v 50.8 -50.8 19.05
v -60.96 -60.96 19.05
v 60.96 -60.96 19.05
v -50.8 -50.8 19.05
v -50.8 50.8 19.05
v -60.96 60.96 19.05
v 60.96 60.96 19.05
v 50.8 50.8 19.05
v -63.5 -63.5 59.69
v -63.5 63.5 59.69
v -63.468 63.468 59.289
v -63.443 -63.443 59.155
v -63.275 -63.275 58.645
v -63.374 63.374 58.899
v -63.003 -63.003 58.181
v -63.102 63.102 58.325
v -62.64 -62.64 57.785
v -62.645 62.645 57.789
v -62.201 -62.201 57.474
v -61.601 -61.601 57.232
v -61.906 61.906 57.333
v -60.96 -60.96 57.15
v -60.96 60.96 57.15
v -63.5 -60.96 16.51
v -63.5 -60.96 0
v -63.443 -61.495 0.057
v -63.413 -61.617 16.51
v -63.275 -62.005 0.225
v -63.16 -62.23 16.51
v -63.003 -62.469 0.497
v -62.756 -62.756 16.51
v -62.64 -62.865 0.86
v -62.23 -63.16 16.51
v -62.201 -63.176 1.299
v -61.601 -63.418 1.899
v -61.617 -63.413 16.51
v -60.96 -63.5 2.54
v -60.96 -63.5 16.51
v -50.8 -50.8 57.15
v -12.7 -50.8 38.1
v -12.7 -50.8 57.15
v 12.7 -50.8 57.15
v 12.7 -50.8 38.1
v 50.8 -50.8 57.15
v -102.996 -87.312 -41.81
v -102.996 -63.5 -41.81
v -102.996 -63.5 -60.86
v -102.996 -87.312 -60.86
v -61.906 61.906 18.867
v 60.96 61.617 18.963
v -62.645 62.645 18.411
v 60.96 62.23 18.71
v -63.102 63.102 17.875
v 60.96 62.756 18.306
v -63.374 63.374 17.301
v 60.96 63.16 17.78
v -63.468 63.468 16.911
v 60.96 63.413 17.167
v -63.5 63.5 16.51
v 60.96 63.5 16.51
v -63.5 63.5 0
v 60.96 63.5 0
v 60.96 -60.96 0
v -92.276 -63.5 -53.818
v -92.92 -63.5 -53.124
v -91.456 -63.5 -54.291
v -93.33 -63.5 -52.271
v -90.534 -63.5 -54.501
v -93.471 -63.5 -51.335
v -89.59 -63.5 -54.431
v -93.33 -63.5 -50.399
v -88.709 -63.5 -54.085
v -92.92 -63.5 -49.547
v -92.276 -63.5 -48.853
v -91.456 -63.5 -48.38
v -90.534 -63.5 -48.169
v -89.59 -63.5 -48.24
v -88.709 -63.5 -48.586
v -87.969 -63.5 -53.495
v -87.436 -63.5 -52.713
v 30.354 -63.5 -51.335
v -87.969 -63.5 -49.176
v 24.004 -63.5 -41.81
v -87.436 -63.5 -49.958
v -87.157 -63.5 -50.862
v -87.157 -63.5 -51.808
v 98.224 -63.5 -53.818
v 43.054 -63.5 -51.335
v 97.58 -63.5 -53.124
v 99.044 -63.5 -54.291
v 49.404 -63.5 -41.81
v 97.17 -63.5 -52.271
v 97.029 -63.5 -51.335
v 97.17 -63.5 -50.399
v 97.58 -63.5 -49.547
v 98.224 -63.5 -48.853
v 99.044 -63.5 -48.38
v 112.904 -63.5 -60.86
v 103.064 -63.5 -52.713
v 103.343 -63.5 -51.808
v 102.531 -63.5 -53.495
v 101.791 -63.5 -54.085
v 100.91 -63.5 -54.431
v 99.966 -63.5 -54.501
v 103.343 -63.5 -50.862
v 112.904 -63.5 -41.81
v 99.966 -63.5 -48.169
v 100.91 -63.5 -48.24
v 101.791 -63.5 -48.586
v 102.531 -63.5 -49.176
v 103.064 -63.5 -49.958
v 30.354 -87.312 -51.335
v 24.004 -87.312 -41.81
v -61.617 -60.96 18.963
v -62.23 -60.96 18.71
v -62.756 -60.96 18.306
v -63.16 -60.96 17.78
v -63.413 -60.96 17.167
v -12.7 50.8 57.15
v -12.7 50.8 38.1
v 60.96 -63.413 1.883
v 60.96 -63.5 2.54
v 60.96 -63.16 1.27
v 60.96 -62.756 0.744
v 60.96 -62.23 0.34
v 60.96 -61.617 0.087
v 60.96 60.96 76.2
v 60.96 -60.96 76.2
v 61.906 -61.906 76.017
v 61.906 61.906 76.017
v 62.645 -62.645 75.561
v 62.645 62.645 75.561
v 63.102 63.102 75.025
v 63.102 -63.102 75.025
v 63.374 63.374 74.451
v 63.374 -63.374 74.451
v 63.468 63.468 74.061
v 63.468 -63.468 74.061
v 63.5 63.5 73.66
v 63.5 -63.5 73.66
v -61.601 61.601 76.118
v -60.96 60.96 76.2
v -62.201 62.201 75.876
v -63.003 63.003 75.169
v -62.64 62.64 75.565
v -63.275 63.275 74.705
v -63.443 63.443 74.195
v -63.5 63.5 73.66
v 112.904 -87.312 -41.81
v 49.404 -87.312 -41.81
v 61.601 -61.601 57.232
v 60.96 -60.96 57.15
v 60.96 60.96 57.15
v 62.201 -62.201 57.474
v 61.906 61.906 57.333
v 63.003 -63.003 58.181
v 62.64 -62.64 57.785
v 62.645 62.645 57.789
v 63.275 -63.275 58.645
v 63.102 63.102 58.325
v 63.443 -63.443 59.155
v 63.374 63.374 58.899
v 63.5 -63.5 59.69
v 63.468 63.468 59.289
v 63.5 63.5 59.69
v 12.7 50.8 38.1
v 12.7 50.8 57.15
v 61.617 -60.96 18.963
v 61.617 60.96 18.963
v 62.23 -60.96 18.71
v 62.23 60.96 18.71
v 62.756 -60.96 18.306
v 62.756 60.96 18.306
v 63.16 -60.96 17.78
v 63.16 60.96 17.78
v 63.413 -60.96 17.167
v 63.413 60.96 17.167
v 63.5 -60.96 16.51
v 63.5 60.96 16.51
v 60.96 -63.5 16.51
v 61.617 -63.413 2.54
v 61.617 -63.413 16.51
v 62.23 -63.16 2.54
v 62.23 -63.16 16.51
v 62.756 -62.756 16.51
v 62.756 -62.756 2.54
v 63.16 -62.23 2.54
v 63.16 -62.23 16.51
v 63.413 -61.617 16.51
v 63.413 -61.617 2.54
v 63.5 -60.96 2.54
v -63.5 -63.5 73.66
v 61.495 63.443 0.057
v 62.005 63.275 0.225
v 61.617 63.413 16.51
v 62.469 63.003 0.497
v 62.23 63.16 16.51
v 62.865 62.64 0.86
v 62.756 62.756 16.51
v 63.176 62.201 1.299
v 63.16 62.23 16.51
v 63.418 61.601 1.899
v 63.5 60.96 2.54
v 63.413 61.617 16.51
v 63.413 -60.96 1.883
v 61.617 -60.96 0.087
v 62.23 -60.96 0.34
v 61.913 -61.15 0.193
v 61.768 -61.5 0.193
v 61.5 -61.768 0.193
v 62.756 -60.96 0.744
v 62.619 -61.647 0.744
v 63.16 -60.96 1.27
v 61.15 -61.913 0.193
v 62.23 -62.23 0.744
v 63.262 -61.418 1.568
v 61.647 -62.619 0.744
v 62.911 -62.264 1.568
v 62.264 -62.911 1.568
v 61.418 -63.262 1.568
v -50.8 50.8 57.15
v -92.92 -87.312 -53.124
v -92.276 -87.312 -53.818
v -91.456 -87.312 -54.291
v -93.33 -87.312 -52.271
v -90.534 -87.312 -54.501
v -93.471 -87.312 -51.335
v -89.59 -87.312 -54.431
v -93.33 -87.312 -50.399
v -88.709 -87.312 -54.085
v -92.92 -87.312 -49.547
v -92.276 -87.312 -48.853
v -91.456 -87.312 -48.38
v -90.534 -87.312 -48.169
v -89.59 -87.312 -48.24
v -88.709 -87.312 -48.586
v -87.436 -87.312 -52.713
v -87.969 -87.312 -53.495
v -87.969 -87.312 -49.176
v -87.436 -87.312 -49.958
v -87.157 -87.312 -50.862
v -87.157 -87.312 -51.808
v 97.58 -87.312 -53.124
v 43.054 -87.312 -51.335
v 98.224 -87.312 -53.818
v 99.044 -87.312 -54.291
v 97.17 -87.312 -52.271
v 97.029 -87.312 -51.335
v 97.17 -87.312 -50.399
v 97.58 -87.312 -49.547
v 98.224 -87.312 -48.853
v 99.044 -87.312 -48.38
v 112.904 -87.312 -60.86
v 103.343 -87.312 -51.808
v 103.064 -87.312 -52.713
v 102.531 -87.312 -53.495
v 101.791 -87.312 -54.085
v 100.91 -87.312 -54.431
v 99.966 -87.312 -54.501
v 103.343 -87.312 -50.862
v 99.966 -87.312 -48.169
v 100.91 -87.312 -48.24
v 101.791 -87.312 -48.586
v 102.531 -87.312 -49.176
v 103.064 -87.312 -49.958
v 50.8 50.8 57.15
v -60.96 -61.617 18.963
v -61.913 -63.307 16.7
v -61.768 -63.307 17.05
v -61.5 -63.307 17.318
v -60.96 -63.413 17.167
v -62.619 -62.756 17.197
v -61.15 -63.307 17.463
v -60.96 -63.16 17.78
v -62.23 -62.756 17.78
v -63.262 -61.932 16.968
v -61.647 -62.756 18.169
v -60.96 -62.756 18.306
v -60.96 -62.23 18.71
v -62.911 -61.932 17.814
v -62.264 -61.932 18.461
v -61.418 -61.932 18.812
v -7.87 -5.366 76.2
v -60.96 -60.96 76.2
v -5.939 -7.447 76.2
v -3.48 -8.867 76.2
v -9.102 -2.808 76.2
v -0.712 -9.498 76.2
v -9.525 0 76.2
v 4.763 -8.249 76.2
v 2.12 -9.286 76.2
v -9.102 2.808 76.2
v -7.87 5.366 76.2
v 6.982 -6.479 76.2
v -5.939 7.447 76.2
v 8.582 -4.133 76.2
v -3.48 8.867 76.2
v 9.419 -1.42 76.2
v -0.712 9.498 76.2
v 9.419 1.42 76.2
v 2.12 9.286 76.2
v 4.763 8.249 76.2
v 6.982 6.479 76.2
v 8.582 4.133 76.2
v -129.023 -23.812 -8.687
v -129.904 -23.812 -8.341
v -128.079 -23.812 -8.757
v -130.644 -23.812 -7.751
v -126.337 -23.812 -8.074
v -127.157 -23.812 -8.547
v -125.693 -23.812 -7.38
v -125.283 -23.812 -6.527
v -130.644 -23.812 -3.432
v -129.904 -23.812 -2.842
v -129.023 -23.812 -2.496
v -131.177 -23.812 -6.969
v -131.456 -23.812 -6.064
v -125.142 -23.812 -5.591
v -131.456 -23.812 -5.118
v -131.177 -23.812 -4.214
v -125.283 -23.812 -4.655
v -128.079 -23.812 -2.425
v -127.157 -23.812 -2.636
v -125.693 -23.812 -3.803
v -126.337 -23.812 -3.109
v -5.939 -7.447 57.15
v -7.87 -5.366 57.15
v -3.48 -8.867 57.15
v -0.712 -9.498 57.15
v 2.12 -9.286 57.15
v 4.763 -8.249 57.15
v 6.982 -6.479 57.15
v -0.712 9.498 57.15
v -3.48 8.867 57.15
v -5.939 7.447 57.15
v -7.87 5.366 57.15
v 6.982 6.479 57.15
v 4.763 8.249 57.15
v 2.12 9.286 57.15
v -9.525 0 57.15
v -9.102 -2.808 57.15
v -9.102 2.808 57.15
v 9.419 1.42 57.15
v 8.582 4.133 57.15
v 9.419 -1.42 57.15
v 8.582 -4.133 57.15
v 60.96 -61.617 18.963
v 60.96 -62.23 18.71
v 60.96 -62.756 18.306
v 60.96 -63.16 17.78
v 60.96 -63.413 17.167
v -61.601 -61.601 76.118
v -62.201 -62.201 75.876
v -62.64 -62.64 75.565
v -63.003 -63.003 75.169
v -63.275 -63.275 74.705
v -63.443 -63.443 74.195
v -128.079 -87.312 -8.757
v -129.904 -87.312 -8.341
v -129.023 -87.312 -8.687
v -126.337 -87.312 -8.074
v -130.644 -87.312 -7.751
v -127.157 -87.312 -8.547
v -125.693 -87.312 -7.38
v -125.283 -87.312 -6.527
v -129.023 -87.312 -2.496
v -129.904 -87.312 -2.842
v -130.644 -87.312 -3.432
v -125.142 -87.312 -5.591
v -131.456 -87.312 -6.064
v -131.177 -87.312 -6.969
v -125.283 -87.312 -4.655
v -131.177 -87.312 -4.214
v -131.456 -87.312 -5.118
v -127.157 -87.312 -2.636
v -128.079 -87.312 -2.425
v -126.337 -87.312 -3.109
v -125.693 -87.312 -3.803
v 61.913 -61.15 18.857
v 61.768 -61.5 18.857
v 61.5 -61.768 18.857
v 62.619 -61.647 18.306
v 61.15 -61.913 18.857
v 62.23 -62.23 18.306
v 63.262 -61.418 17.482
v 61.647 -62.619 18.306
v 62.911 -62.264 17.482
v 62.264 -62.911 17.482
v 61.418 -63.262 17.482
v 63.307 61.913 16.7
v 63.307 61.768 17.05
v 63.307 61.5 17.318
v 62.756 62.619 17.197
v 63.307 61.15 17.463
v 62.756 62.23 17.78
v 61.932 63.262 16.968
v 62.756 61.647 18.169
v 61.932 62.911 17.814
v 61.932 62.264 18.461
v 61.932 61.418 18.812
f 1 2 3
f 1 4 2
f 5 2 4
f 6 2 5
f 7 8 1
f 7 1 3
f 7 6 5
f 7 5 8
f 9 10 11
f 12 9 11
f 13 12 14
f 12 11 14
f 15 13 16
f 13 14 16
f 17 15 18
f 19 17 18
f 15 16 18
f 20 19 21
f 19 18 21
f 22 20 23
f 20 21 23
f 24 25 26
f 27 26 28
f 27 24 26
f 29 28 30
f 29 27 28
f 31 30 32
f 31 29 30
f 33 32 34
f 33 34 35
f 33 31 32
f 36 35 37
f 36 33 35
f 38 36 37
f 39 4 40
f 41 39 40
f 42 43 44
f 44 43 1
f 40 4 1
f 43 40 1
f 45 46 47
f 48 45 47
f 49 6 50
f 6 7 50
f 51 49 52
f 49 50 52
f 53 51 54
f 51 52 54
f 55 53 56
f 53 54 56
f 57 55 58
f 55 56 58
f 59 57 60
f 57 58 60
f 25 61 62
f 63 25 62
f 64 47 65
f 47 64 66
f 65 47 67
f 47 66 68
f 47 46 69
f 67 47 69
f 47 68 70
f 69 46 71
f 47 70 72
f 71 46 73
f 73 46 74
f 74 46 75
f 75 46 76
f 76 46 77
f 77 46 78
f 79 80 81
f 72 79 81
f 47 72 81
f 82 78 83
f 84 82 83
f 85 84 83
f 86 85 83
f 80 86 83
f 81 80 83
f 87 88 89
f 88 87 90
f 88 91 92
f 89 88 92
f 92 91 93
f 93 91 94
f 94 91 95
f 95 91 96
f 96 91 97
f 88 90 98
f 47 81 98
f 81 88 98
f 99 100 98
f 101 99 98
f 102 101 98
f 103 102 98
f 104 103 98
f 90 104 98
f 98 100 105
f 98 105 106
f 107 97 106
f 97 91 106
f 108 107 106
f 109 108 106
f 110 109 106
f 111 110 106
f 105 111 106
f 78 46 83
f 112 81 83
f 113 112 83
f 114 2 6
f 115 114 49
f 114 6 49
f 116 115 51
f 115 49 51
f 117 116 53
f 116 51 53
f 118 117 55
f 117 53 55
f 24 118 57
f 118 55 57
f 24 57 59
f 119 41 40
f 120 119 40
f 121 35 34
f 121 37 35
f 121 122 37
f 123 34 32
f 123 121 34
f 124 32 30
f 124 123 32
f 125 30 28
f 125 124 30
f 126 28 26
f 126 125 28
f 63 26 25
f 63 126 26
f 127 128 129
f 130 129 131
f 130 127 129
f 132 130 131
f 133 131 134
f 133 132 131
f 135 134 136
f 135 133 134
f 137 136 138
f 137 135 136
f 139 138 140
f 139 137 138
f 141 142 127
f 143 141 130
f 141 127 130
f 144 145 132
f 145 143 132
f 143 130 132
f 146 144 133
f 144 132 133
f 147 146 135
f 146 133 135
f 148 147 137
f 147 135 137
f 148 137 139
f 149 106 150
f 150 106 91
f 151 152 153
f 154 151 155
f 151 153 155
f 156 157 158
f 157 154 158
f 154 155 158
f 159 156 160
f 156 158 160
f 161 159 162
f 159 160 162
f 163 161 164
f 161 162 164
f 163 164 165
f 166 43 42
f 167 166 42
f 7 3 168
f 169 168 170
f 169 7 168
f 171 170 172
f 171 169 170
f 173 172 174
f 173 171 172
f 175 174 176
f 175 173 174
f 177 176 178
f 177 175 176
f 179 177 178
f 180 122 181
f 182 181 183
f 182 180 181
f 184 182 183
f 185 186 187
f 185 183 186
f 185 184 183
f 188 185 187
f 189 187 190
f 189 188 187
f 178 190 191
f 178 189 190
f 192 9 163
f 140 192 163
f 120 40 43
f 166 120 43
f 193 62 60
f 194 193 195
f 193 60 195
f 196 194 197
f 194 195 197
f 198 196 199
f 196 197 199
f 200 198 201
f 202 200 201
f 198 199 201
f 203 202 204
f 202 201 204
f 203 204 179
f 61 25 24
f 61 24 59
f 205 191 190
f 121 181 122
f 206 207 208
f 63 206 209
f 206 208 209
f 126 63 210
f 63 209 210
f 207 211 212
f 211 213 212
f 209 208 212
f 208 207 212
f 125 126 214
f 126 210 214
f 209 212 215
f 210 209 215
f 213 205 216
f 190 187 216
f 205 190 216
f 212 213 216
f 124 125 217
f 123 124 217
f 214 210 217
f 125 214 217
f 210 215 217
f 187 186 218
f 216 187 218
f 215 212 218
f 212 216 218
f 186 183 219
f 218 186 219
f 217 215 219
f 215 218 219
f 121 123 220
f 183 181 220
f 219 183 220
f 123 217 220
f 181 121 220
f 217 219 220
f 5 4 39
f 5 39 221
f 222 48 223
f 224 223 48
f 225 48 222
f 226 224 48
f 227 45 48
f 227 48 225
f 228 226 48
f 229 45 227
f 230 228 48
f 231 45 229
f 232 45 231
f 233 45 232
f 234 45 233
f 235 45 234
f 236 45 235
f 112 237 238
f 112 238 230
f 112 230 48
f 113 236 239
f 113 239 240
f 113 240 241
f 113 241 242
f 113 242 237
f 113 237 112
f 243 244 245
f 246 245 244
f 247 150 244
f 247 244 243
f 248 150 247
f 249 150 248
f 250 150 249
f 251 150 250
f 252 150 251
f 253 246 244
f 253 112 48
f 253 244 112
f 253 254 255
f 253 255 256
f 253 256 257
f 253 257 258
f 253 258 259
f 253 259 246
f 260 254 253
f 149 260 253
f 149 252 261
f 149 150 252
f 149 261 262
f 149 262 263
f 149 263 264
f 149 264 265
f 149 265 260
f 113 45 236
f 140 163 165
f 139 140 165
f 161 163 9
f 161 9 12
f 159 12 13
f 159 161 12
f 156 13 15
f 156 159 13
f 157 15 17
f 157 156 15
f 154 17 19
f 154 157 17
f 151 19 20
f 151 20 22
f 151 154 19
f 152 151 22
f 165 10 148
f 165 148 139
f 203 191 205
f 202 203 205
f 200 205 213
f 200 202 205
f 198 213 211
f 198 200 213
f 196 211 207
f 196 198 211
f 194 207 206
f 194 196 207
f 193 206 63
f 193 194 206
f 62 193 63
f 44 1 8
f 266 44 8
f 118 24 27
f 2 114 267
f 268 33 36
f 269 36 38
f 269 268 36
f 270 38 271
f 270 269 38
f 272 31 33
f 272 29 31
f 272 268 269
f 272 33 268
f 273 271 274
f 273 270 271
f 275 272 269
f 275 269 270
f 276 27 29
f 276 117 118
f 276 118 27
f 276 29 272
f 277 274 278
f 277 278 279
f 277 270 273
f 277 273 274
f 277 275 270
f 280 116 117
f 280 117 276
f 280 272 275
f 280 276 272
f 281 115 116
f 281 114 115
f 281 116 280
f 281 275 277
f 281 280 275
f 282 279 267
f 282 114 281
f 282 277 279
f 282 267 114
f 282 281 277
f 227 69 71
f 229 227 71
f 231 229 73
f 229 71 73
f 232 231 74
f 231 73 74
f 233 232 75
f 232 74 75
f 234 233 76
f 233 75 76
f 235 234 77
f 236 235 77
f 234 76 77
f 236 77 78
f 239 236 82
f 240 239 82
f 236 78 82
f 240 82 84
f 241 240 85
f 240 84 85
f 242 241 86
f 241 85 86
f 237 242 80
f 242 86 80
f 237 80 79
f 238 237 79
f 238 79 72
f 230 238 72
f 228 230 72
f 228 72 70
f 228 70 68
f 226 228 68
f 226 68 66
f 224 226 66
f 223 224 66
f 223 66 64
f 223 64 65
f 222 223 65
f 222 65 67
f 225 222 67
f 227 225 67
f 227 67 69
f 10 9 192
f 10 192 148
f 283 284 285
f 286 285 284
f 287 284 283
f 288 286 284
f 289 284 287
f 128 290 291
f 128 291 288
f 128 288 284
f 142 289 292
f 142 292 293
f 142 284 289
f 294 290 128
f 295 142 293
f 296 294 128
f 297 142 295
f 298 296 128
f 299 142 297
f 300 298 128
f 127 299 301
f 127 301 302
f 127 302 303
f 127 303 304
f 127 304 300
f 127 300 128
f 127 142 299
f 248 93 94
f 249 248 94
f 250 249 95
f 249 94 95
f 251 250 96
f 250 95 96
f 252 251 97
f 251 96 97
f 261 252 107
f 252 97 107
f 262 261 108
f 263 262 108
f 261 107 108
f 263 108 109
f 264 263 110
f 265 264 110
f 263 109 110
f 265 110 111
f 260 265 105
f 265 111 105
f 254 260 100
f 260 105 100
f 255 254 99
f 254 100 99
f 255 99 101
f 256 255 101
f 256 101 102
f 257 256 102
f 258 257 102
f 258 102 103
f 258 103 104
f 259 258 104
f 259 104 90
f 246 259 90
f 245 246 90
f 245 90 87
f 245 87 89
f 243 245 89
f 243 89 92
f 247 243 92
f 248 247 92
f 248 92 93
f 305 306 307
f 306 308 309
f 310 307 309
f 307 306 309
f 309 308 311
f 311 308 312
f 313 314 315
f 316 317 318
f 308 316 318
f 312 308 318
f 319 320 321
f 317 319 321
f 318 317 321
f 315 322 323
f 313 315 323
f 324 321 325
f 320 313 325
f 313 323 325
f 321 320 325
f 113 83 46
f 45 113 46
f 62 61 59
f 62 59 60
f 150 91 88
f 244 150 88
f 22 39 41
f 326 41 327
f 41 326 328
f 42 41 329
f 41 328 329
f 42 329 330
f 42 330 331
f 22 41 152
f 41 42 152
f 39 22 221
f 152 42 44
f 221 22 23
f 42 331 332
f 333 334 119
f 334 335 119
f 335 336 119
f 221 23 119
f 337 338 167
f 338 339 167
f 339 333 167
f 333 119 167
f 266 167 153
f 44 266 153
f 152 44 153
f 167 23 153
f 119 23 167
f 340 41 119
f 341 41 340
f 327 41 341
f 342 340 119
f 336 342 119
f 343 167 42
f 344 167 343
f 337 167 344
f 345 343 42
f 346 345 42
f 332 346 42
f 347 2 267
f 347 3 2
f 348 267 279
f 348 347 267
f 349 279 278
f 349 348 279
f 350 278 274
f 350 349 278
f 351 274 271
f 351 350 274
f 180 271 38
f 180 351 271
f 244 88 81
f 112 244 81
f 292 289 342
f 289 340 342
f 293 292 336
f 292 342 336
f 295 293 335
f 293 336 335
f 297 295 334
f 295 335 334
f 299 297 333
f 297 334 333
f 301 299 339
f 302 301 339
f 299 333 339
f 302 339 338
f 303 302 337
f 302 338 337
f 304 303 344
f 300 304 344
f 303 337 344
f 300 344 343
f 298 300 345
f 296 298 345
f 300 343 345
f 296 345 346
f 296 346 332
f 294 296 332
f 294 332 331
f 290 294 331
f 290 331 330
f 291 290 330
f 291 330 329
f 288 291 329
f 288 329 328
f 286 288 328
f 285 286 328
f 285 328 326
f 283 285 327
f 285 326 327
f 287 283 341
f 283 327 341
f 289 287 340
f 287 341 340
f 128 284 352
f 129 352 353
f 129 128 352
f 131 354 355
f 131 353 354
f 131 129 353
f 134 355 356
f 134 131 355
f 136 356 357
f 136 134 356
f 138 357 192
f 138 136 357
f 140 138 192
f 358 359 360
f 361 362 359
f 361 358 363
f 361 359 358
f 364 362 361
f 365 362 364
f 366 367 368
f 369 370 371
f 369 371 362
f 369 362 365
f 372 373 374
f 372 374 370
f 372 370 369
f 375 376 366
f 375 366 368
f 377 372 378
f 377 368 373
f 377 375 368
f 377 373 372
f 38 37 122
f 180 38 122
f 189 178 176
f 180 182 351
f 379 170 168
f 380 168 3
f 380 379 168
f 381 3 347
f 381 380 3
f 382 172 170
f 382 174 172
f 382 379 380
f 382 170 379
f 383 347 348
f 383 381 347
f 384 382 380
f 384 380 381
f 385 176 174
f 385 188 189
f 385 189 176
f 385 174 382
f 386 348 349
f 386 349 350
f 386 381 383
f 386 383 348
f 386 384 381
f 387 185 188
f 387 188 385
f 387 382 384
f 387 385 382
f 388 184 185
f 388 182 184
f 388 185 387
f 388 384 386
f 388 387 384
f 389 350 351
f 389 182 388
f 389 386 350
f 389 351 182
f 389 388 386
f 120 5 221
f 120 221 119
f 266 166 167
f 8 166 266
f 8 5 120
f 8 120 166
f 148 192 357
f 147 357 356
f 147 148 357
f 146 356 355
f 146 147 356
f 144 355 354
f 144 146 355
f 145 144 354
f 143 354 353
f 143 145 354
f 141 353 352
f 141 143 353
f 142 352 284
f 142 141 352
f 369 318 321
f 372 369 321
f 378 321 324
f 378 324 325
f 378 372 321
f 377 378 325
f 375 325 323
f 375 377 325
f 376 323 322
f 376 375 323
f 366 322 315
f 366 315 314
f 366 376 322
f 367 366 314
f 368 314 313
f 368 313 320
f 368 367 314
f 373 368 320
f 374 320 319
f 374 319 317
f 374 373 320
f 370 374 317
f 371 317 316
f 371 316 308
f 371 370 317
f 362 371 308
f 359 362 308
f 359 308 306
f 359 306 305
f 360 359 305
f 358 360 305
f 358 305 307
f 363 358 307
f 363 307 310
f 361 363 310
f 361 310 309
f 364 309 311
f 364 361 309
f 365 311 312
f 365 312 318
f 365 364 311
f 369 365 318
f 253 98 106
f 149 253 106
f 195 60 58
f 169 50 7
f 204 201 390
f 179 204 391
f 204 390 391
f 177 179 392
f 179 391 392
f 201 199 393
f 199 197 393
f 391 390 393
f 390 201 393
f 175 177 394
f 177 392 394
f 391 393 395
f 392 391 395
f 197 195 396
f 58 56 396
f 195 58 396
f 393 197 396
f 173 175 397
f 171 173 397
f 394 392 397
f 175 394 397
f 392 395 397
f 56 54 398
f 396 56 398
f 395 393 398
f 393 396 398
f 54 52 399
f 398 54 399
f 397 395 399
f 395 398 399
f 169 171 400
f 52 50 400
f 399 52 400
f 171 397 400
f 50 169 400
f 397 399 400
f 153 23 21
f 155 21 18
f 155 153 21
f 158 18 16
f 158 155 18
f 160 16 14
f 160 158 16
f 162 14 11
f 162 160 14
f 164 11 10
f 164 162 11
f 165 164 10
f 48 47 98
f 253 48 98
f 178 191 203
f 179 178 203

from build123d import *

# Parameters (mm, degrees)
F0_W      = 127
F0_H      = 127
F1_DEPTH  = 19.05
F2_W      = 101.6
F2_H      = 101.6
F3_DEPTH  = 38.1
F4_W      = 127
F4_H      = 127
F4_W_2    = 101.6
F4_H_2    = 101.6
F5_DEPTH  = 19.05
F7_DEPTH  = 101.6
F9_D      = 19.05
F9_DEPTH  = 19.05
F9_TIP    = 5.7231973962
F10_R     = 2.54
F11_R     = 2.54
F12_R     = 2.54
F14_DEPTH = 23.8125
F16_D     = 6.35
F17_R     = 3.175
F18_DEPTH = 63.5
F20_DEPTH = 101.6
F21_R     = 31.75
F22_DEPTH = 38.1


with BuildPart() as f1:
    # F0 (on Top) → F1 (new body)
    with BuildSketch(Plane.XY):
        Rectangle(F0_W, F0_H)
    extrude(amount=F1_DEPTH)

    # F2 (on face) → F3 (join)
    with BuildSketch(Plane.XY.offset(19.05)):
        Rectangle(F2_W, F2_H)
    extrude(amount=F3_DEPTH)

    # F4 (on face) → F5 (join)
    with BuildSketch(Plane.XY.offset(57.15)):
        Rectangle(F4_W, F4_H)
        Rectangle(F4_W_2, F4_H_2, mode=Mode.SUBTRACT)
        Rectangle(F4_W_2, F4_H_2)
    extrude(amount=F5_DEPTH)

    # F6 (on face) → F7 (cut)
    with BuildSketch(Plane.XZ.offset(50.8)):
        Polygon((-12.7, 38.1), (0, 38.1), (12.7, 38.1), (12.7, 57.15), (-12.7, 57.15), align=None)
    extrude(amount=-F7_DEPTH, mode=Mode.SUBTRACT)

    # F9
    with Locations(Plane.XY.offset(76.2)):
        with Locations((0, 0)):
            Hole(F9_D / 2, depth=F9_DEPTH)
            with Locations((0, 0, -(F9_DEPTH + F9_TIP / 2))):  # 118° drill point
                Cone(0, F9_D / 2, F9_TIP, mode=Mode.SUBTRACT)

    # F10
    f10_edges = [f1.edges().sort_by_distance(p)[0] for p in [
        (-63.5, 0, 76.2),
        (0, 63.5, 76.2),
        (63.5, 0, 76.2),
        (0, -63.5, 76.2),
    ]]
    fillet(f10_edges, radius=F10_R)

    # F11
    f11_edges = [f1.edges().sort_by_distance(p)[0] for p in [
        (0, -63.5, 57.15),
        (63.5, 0, 57.15),
        (0, 63.5, 57.15),
        (-63.5, 0, 57.15),
    ]]
    fillet(f11_edges, radius=F11_R)

    # F12
    f12_edges = [f1.edges().sort_by_distance(p)[0] for p in [
        (-63.5, 0, 19.05),
        (0, 63.5, 19.05),
        (63.5, -63.5, 9.525),
        (63.5, 63.5, 9.525),
        (63.5, 0, 0),
        (63.5, 0, 19.05),
        (-63.5, -63.5, 9.525),
        (0, -63.5, 0),
        (0, -63.5, 19.05),
    ]]
    fillet(f12_edges, radius=F12_R)


with BuildPart() as f14:
    # F13 (on face) → F14 (new body)
    with BuildSketch(Plane.XZ.offset(63.5)):
        Polygon((-102.9964814901, -41.8102111943), (-102.9964814901, -60.8602111943), (112.9035185099, -60.8602111943), (112.9035185099, -41.8102111943), (49.4035185099, -41.8102111943), (43.0535185099, -51.3352111943), (36.7035185099, -51.3352111943), (30.3535185099, -51.3352111943), (24.0035185099, -41.8102111943), align=None)
    extrude(amount=F14_DEPTH)

    # F16 (through all)
    with Locations(Plane.XZ.offset(87.3125)):
        with Locations((-90.2964814901, -51.3352111943), (100.2035185099, -51.3352111943)):
            Hole(F16_D / 2)


with BuildPart() as f18:
    # F17 (on face) → F18 (new body)
    with BuildSketch(Plane.XZ.offset(87.3125)):
        with Locations((-128.3167302608, -5.5912164971)):
            Circle(F17_R)
    extrude(amount=-F18_DEPTH)


with BuildPart() as f20:
    # F19 (on Top) → F20 (new body)
    with BuildSketch(Plane.XY):
        with BuildLine():
            Line((-82.8644239783, -340.8923311382), (-44.7644239783, -340.8923311382))
            ThreePointArc((-44.7644239783, -340.8923311382), (-31.2940397967, -335.3127153198), (-25.7144239783, -321.8423311382))
            Line((-25.7144239783, -321.8423311382), (-25.7144239783, -283.7423311382))
            ThreePointArc((-25.7144239783, -283.7423311382), (-31.2940397967, -270.2719469566), (-44.7644239783, -264.6923311382))
            Line((-44.7644239783, -264.6923311382), (-82.8644239783, -264.6923311382))
            ThreePointArc((-82.8644239783, -264.6923311382), (-96.3348081599, -270.2719469566), (-101.9144239783, -283.7423311382))
            Line((-101.9144239783, -283.7423311382), (-101.9144239783, -321.8423311382))
            ThreePointArc((-101.9144239783, -321.8423311382), (-96.3348081599, -335.3127153198), (-82.8644239783, -340.8923311382))
        make_face()
    extrude(amount=F20_DEPTH)

    # F21 (on face) → F22 (join)
    with BuildSketch(Plane(origin=(0, 0, 0), x_dir=(1, 0, 0), z_dir=(0, 0, -1))):
        with Locations((-63.8144239783, 302.7923311382)):
            Circle(F21_R)
    extrude(amount=F22_DEPTH)


solid = Compound([f1.part, f14.part, f18.part])
